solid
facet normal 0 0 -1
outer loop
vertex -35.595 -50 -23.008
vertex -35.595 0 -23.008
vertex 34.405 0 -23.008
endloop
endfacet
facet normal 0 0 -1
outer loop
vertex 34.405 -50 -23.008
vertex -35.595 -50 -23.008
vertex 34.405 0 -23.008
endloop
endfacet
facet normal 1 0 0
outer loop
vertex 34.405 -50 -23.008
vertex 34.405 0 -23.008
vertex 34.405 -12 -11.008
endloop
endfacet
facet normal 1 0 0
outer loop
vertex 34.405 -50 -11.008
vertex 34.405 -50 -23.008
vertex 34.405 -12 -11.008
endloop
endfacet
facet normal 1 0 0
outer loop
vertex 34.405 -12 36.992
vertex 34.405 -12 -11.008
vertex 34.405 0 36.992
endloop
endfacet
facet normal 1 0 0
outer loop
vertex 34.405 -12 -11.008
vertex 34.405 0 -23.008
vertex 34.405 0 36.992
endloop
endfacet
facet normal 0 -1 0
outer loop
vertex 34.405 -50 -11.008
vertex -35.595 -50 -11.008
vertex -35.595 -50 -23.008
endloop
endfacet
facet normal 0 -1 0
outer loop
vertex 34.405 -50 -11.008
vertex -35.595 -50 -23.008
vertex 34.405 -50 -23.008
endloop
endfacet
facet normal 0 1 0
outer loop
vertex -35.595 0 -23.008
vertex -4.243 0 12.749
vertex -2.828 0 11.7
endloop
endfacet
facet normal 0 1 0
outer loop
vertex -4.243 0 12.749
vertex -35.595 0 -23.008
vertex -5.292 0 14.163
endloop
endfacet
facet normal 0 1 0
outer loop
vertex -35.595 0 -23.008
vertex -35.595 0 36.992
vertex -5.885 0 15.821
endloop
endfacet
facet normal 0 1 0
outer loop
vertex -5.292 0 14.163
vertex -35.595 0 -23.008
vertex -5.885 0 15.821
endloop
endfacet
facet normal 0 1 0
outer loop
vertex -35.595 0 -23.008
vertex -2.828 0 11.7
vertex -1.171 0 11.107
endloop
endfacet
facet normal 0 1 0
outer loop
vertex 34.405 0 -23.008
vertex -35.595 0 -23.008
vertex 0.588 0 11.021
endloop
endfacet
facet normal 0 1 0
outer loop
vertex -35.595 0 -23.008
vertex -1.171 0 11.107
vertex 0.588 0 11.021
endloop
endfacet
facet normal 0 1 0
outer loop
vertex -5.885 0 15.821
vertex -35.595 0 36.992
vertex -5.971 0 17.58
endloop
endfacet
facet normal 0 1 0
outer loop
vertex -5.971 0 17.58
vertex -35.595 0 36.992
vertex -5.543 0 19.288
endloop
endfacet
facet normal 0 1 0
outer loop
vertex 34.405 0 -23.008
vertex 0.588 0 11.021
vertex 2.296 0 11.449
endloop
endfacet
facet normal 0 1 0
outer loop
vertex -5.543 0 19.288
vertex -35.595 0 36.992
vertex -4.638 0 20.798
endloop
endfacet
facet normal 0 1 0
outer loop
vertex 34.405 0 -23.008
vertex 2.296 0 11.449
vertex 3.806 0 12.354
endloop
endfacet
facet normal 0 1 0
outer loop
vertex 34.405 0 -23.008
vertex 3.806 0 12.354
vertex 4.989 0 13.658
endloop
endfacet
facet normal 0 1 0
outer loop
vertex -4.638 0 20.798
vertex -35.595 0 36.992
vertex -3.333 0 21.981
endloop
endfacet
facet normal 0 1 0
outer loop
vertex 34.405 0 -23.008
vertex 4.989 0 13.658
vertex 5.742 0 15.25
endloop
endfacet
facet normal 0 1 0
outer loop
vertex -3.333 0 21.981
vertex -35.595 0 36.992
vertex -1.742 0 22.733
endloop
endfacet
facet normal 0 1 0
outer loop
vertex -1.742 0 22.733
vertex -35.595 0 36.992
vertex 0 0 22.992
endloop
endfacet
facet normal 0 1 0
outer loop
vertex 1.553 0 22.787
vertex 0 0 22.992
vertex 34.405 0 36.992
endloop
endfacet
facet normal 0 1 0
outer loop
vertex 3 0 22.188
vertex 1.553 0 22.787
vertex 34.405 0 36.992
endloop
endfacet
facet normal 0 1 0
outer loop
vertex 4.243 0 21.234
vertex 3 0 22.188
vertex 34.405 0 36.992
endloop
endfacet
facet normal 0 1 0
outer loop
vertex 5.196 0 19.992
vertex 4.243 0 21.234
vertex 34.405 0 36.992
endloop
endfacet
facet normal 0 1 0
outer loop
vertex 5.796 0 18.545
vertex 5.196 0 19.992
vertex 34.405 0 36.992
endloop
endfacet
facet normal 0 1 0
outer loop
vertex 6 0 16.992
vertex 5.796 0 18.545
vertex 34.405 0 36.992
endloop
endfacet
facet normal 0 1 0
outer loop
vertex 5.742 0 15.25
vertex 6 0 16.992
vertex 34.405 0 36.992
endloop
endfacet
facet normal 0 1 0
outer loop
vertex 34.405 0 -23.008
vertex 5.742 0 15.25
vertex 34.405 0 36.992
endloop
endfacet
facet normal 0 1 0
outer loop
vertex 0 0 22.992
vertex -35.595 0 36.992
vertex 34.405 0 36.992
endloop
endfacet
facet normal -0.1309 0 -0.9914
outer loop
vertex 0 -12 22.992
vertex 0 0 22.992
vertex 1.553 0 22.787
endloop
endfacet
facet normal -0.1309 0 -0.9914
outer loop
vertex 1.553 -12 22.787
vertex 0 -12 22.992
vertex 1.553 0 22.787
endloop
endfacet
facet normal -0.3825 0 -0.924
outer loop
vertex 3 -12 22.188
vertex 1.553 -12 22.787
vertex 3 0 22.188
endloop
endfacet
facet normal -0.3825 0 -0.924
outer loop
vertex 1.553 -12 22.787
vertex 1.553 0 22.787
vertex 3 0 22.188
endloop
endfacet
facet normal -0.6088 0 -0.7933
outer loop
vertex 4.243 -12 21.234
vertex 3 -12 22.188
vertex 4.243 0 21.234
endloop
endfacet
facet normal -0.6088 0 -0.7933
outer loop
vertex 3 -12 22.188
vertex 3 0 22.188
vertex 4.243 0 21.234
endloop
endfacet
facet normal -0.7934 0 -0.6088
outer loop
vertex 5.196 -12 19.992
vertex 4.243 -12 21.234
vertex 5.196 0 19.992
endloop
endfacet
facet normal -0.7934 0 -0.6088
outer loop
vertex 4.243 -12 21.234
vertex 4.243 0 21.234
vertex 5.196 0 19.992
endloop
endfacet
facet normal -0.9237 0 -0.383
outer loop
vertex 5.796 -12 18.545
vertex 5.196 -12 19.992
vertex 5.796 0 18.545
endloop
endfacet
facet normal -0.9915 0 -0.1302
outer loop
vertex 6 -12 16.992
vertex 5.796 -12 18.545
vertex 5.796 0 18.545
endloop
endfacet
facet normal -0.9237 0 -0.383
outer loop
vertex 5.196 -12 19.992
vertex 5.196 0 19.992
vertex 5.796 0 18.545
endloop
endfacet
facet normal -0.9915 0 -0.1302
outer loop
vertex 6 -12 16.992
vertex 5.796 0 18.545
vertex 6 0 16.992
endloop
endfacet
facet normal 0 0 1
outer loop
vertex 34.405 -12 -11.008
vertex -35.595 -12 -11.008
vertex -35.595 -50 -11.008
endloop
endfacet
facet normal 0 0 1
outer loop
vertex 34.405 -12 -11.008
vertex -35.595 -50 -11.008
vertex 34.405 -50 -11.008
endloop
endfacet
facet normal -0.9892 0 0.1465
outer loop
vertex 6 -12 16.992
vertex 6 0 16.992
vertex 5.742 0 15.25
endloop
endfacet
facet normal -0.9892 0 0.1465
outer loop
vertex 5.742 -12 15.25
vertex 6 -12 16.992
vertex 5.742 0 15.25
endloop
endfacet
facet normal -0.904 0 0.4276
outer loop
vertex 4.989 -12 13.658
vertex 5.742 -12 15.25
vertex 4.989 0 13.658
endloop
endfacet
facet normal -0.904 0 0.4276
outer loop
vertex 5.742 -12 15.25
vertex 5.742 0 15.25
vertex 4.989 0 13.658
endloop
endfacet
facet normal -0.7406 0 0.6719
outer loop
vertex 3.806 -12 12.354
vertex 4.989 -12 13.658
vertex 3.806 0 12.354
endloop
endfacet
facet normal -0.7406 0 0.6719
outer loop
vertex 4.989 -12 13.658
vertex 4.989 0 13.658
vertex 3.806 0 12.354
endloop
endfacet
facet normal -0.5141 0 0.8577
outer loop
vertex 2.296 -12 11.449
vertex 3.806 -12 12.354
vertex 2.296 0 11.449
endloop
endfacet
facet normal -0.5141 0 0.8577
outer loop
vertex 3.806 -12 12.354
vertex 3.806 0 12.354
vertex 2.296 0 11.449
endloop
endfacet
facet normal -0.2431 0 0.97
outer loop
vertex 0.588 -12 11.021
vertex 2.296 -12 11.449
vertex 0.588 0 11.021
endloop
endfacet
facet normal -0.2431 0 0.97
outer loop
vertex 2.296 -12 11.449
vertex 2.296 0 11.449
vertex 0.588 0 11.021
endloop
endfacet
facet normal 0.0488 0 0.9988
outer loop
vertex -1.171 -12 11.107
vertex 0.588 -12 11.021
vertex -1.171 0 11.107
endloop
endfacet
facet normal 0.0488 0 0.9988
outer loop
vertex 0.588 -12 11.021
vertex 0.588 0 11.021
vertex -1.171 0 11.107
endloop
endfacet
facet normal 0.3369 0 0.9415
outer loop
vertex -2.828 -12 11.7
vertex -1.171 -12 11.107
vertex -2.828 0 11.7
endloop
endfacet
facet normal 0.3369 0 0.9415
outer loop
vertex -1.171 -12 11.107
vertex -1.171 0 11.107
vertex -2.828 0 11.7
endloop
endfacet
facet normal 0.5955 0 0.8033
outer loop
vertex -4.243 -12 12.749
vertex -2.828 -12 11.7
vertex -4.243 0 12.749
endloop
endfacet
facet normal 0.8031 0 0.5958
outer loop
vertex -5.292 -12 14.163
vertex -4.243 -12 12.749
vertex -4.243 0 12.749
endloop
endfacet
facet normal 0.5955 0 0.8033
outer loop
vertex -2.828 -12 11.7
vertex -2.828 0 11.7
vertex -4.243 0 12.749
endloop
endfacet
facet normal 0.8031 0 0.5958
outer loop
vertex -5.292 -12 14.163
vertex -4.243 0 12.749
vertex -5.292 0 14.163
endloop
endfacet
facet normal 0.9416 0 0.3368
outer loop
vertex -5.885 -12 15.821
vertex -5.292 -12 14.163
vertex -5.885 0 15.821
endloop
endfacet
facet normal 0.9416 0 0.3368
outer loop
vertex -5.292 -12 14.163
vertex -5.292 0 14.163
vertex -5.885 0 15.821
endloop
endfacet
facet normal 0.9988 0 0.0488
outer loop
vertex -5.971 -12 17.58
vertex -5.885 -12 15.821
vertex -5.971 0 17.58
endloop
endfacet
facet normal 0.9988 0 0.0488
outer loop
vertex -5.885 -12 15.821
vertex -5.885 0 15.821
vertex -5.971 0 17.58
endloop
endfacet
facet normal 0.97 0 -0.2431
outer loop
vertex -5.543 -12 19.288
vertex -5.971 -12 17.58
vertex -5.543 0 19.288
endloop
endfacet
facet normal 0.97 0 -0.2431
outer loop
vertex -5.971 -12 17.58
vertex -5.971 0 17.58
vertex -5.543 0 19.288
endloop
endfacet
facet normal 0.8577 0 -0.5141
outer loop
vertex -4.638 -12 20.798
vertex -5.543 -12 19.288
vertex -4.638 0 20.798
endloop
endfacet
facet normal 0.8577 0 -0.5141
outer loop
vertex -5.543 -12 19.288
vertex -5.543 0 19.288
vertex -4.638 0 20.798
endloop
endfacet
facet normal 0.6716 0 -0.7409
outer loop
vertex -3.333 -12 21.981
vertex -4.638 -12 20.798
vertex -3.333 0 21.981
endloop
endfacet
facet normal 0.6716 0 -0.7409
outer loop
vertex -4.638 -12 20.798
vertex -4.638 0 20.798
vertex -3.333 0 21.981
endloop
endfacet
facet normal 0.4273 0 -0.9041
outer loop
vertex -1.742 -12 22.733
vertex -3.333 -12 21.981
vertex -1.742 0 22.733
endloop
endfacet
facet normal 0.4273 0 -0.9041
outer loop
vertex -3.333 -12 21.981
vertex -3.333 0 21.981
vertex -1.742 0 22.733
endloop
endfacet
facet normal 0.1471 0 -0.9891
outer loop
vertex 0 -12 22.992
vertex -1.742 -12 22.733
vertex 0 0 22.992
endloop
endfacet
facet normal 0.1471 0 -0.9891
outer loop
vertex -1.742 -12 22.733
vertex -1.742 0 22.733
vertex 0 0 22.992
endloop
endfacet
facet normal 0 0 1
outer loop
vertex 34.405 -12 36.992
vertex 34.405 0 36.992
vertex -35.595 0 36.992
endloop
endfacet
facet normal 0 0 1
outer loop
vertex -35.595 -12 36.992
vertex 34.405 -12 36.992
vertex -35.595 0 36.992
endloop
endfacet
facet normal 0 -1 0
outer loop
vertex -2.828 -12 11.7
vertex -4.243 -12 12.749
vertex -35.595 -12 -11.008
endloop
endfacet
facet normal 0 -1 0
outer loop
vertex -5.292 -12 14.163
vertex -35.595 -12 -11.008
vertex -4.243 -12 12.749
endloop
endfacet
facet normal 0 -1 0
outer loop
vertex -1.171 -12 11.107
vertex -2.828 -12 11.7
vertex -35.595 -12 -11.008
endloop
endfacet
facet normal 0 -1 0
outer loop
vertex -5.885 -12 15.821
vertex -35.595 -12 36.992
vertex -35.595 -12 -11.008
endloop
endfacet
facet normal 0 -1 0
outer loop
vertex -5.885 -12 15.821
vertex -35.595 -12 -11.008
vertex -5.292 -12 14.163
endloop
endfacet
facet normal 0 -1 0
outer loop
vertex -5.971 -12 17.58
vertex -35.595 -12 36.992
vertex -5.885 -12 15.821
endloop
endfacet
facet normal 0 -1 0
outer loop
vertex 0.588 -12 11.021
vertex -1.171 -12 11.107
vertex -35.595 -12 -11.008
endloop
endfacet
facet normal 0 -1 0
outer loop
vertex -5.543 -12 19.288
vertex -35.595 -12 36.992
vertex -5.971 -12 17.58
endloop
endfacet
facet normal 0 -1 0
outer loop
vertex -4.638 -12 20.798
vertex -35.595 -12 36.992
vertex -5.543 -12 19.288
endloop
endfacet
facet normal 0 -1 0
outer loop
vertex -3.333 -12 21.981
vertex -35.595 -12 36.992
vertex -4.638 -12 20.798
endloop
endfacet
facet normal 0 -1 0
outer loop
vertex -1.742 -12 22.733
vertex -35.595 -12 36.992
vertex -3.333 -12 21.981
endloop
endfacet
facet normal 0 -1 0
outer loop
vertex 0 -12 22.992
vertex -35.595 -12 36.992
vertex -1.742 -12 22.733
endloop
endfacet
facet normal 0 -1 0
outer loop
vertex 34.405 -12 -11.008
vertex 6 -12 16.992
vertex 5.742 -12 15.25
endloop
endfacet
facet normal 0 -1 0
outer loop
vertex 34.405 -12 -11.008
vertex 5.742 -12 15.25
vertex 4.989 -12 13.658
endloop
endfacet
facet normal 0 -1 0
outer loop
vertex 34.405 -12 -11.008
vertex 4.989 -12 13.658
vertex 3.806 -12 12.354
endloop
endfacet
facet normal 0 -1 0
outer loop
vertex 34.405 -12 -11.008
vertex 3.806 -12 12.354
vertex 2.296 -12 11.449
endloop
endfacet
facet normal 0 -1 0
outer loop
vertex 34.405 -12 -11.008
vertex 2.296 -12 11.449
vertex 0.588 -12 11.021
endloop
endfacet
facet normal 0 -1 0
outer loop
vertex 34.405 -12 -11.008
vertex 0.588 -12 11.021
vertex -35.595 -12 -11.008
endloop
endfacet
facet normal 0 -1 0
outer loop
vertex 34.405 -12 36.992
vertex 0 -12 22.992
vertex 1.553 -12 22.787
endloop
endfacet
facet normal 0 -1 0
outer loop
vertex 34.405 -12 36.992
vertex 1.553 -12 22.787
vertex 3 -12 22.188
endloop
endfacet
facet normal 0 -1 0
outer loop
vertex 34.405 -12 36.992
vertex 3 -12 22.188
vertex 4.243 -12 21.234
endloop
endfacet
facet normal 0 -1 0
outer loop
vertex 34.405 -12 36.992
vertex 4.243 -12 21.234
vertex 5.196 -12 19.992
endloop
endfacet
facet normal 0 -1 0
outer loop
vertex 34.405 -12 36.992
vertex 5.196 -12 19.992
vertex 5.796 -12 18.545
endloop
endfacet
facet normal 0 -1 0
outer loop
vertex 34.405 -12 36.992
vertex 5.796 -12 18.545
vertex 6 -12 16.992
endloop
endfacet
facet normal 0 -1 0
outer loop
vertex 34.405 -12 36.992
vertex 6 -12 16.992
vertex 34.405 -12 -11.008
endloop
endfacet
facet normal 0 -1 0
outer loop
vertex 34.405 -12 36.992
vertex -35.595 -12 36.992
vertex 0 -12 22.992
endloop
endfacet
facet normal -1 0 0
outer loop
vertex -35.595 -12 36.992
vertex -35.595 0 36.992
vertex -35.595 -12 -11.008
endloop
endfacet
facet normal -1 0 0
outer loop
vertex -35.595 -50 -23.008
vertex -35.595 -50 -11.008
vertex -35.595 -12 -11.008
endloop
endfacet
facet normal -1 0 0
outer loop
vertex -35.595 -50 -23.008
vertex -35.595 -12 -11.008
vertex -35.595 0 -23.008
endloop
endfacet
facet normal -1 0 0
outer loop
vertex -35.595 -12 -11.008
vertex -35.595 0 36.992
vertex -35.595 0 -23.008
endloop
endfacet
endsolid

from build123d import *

# Parameters (mm, degrees)
F0_W     = 70
F0_H     = 12
F1_DEPTH = 50
F2_DEPTH = 12


with BuildPart() as f1:
    # F0 (on Front) → F1 (new body)
    with BuildSketch(Plane.XZ):
        with Locations((-0.595462, -17.008216)):
            Rectangle(F0_W, F0_H)
    extrude(amount=F1_DEPTH)

    # F0 (on Front) → F2 (join)
    with BuildSketch(Plane.XZ):
        with BuildLine():
            ThreePointArc((6, 16.991784), (4.242641, 21.234424), (0, 22.991784))
            ThreePointArc((0, 22.991784), (-4.242641, 12.749143), (6, 16.991784))
        make_face()
        Polygon((0, 36.991784), (-35.595462, 36.991784), (-35.595462, -11.008216), (34.404538, -11.008216), (34.404538, 36.991784), align=None)
        with BuildLine():
            ThreePointArc((6, 16.991784), (-4.242641, 12.749143), (0, 22.991784))
            ThreePointArc((0, 22.991784), (4.242641, 21.234424), (6, 16.991784))
        make_face(mode=Mode.SUBTRACT)
        with Locations((-0.595462, -17.008216)):
            Rectangle(F0_W, F0_H)
    extrude(amount=F2_DEPTH)


solid = f1.part
